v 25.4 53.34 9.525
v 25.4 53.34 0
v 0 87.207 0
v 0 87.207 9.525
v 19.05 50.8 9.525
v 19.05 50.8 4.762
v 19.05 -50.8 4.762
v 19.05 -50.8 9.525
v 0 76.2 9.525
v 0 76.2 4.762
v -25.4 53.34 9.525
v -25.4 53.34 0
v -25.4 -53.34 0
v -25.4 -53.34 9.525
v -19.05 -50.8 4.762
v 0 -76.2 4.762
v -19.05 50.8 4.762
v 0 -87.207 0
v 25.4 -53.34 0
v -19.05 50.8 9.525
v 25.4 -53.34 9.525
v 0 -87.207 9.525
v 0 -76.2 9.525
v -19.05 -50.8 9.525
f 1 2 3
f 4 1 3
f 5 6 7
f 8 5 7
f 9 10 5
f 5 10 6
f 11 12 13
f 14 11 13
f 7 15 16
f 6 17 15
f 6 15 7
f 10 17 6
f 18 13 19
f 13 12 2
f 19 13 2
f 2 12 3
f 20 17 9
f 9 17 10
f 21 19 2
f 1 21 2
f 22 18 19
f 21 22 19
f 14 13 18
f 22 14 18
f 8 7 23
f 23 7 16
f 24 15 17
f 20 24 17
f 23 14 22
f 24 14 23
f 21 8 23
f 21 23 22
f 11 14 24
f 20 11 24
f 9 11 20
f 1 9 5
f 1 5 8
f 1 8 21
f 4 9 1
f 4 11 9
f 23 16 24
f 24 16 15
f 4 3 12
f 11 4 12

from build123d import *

# Parameters (mm, degrees)
F1_DEPTH = 9.525
F2_DEPTH = 4.7625


# Not quite as in the source:
# - a feature names something its author has since deleted; it is built from what else it names


with BuildPart() as f1:
    # F0 (on Top) → F1 (new body)
    with BuildSketch(Plane.XY):
        Polygon((0, 87.2066666667), (-25.4, 53.34), (-25.4, -53.34), (0, -87.2066666667), (25.4, -53.34), (25.4, 53.34), align=None)
        Polygon((-19.05, -50.8), (-19.05, 50.8), (0, 76.2), (19.05, 50.8), (19.05, -50.8), (0, -76.2), align=None, mode=Mode.SUBTRACT)
    extrude(amount=F1_DEPTH)

    # F0 (on Top) → F2 (join)
    with BuildSketch(Plane.XY):
        Polygon((0, 76.2), (-19.05, 50.8), (-19.05, -50.8), (0, -76.2), (19.05, -50.8), (19.05, 50.8), align=None)
    extrude(amount=F2_DEPTH)


solid = f1.part
